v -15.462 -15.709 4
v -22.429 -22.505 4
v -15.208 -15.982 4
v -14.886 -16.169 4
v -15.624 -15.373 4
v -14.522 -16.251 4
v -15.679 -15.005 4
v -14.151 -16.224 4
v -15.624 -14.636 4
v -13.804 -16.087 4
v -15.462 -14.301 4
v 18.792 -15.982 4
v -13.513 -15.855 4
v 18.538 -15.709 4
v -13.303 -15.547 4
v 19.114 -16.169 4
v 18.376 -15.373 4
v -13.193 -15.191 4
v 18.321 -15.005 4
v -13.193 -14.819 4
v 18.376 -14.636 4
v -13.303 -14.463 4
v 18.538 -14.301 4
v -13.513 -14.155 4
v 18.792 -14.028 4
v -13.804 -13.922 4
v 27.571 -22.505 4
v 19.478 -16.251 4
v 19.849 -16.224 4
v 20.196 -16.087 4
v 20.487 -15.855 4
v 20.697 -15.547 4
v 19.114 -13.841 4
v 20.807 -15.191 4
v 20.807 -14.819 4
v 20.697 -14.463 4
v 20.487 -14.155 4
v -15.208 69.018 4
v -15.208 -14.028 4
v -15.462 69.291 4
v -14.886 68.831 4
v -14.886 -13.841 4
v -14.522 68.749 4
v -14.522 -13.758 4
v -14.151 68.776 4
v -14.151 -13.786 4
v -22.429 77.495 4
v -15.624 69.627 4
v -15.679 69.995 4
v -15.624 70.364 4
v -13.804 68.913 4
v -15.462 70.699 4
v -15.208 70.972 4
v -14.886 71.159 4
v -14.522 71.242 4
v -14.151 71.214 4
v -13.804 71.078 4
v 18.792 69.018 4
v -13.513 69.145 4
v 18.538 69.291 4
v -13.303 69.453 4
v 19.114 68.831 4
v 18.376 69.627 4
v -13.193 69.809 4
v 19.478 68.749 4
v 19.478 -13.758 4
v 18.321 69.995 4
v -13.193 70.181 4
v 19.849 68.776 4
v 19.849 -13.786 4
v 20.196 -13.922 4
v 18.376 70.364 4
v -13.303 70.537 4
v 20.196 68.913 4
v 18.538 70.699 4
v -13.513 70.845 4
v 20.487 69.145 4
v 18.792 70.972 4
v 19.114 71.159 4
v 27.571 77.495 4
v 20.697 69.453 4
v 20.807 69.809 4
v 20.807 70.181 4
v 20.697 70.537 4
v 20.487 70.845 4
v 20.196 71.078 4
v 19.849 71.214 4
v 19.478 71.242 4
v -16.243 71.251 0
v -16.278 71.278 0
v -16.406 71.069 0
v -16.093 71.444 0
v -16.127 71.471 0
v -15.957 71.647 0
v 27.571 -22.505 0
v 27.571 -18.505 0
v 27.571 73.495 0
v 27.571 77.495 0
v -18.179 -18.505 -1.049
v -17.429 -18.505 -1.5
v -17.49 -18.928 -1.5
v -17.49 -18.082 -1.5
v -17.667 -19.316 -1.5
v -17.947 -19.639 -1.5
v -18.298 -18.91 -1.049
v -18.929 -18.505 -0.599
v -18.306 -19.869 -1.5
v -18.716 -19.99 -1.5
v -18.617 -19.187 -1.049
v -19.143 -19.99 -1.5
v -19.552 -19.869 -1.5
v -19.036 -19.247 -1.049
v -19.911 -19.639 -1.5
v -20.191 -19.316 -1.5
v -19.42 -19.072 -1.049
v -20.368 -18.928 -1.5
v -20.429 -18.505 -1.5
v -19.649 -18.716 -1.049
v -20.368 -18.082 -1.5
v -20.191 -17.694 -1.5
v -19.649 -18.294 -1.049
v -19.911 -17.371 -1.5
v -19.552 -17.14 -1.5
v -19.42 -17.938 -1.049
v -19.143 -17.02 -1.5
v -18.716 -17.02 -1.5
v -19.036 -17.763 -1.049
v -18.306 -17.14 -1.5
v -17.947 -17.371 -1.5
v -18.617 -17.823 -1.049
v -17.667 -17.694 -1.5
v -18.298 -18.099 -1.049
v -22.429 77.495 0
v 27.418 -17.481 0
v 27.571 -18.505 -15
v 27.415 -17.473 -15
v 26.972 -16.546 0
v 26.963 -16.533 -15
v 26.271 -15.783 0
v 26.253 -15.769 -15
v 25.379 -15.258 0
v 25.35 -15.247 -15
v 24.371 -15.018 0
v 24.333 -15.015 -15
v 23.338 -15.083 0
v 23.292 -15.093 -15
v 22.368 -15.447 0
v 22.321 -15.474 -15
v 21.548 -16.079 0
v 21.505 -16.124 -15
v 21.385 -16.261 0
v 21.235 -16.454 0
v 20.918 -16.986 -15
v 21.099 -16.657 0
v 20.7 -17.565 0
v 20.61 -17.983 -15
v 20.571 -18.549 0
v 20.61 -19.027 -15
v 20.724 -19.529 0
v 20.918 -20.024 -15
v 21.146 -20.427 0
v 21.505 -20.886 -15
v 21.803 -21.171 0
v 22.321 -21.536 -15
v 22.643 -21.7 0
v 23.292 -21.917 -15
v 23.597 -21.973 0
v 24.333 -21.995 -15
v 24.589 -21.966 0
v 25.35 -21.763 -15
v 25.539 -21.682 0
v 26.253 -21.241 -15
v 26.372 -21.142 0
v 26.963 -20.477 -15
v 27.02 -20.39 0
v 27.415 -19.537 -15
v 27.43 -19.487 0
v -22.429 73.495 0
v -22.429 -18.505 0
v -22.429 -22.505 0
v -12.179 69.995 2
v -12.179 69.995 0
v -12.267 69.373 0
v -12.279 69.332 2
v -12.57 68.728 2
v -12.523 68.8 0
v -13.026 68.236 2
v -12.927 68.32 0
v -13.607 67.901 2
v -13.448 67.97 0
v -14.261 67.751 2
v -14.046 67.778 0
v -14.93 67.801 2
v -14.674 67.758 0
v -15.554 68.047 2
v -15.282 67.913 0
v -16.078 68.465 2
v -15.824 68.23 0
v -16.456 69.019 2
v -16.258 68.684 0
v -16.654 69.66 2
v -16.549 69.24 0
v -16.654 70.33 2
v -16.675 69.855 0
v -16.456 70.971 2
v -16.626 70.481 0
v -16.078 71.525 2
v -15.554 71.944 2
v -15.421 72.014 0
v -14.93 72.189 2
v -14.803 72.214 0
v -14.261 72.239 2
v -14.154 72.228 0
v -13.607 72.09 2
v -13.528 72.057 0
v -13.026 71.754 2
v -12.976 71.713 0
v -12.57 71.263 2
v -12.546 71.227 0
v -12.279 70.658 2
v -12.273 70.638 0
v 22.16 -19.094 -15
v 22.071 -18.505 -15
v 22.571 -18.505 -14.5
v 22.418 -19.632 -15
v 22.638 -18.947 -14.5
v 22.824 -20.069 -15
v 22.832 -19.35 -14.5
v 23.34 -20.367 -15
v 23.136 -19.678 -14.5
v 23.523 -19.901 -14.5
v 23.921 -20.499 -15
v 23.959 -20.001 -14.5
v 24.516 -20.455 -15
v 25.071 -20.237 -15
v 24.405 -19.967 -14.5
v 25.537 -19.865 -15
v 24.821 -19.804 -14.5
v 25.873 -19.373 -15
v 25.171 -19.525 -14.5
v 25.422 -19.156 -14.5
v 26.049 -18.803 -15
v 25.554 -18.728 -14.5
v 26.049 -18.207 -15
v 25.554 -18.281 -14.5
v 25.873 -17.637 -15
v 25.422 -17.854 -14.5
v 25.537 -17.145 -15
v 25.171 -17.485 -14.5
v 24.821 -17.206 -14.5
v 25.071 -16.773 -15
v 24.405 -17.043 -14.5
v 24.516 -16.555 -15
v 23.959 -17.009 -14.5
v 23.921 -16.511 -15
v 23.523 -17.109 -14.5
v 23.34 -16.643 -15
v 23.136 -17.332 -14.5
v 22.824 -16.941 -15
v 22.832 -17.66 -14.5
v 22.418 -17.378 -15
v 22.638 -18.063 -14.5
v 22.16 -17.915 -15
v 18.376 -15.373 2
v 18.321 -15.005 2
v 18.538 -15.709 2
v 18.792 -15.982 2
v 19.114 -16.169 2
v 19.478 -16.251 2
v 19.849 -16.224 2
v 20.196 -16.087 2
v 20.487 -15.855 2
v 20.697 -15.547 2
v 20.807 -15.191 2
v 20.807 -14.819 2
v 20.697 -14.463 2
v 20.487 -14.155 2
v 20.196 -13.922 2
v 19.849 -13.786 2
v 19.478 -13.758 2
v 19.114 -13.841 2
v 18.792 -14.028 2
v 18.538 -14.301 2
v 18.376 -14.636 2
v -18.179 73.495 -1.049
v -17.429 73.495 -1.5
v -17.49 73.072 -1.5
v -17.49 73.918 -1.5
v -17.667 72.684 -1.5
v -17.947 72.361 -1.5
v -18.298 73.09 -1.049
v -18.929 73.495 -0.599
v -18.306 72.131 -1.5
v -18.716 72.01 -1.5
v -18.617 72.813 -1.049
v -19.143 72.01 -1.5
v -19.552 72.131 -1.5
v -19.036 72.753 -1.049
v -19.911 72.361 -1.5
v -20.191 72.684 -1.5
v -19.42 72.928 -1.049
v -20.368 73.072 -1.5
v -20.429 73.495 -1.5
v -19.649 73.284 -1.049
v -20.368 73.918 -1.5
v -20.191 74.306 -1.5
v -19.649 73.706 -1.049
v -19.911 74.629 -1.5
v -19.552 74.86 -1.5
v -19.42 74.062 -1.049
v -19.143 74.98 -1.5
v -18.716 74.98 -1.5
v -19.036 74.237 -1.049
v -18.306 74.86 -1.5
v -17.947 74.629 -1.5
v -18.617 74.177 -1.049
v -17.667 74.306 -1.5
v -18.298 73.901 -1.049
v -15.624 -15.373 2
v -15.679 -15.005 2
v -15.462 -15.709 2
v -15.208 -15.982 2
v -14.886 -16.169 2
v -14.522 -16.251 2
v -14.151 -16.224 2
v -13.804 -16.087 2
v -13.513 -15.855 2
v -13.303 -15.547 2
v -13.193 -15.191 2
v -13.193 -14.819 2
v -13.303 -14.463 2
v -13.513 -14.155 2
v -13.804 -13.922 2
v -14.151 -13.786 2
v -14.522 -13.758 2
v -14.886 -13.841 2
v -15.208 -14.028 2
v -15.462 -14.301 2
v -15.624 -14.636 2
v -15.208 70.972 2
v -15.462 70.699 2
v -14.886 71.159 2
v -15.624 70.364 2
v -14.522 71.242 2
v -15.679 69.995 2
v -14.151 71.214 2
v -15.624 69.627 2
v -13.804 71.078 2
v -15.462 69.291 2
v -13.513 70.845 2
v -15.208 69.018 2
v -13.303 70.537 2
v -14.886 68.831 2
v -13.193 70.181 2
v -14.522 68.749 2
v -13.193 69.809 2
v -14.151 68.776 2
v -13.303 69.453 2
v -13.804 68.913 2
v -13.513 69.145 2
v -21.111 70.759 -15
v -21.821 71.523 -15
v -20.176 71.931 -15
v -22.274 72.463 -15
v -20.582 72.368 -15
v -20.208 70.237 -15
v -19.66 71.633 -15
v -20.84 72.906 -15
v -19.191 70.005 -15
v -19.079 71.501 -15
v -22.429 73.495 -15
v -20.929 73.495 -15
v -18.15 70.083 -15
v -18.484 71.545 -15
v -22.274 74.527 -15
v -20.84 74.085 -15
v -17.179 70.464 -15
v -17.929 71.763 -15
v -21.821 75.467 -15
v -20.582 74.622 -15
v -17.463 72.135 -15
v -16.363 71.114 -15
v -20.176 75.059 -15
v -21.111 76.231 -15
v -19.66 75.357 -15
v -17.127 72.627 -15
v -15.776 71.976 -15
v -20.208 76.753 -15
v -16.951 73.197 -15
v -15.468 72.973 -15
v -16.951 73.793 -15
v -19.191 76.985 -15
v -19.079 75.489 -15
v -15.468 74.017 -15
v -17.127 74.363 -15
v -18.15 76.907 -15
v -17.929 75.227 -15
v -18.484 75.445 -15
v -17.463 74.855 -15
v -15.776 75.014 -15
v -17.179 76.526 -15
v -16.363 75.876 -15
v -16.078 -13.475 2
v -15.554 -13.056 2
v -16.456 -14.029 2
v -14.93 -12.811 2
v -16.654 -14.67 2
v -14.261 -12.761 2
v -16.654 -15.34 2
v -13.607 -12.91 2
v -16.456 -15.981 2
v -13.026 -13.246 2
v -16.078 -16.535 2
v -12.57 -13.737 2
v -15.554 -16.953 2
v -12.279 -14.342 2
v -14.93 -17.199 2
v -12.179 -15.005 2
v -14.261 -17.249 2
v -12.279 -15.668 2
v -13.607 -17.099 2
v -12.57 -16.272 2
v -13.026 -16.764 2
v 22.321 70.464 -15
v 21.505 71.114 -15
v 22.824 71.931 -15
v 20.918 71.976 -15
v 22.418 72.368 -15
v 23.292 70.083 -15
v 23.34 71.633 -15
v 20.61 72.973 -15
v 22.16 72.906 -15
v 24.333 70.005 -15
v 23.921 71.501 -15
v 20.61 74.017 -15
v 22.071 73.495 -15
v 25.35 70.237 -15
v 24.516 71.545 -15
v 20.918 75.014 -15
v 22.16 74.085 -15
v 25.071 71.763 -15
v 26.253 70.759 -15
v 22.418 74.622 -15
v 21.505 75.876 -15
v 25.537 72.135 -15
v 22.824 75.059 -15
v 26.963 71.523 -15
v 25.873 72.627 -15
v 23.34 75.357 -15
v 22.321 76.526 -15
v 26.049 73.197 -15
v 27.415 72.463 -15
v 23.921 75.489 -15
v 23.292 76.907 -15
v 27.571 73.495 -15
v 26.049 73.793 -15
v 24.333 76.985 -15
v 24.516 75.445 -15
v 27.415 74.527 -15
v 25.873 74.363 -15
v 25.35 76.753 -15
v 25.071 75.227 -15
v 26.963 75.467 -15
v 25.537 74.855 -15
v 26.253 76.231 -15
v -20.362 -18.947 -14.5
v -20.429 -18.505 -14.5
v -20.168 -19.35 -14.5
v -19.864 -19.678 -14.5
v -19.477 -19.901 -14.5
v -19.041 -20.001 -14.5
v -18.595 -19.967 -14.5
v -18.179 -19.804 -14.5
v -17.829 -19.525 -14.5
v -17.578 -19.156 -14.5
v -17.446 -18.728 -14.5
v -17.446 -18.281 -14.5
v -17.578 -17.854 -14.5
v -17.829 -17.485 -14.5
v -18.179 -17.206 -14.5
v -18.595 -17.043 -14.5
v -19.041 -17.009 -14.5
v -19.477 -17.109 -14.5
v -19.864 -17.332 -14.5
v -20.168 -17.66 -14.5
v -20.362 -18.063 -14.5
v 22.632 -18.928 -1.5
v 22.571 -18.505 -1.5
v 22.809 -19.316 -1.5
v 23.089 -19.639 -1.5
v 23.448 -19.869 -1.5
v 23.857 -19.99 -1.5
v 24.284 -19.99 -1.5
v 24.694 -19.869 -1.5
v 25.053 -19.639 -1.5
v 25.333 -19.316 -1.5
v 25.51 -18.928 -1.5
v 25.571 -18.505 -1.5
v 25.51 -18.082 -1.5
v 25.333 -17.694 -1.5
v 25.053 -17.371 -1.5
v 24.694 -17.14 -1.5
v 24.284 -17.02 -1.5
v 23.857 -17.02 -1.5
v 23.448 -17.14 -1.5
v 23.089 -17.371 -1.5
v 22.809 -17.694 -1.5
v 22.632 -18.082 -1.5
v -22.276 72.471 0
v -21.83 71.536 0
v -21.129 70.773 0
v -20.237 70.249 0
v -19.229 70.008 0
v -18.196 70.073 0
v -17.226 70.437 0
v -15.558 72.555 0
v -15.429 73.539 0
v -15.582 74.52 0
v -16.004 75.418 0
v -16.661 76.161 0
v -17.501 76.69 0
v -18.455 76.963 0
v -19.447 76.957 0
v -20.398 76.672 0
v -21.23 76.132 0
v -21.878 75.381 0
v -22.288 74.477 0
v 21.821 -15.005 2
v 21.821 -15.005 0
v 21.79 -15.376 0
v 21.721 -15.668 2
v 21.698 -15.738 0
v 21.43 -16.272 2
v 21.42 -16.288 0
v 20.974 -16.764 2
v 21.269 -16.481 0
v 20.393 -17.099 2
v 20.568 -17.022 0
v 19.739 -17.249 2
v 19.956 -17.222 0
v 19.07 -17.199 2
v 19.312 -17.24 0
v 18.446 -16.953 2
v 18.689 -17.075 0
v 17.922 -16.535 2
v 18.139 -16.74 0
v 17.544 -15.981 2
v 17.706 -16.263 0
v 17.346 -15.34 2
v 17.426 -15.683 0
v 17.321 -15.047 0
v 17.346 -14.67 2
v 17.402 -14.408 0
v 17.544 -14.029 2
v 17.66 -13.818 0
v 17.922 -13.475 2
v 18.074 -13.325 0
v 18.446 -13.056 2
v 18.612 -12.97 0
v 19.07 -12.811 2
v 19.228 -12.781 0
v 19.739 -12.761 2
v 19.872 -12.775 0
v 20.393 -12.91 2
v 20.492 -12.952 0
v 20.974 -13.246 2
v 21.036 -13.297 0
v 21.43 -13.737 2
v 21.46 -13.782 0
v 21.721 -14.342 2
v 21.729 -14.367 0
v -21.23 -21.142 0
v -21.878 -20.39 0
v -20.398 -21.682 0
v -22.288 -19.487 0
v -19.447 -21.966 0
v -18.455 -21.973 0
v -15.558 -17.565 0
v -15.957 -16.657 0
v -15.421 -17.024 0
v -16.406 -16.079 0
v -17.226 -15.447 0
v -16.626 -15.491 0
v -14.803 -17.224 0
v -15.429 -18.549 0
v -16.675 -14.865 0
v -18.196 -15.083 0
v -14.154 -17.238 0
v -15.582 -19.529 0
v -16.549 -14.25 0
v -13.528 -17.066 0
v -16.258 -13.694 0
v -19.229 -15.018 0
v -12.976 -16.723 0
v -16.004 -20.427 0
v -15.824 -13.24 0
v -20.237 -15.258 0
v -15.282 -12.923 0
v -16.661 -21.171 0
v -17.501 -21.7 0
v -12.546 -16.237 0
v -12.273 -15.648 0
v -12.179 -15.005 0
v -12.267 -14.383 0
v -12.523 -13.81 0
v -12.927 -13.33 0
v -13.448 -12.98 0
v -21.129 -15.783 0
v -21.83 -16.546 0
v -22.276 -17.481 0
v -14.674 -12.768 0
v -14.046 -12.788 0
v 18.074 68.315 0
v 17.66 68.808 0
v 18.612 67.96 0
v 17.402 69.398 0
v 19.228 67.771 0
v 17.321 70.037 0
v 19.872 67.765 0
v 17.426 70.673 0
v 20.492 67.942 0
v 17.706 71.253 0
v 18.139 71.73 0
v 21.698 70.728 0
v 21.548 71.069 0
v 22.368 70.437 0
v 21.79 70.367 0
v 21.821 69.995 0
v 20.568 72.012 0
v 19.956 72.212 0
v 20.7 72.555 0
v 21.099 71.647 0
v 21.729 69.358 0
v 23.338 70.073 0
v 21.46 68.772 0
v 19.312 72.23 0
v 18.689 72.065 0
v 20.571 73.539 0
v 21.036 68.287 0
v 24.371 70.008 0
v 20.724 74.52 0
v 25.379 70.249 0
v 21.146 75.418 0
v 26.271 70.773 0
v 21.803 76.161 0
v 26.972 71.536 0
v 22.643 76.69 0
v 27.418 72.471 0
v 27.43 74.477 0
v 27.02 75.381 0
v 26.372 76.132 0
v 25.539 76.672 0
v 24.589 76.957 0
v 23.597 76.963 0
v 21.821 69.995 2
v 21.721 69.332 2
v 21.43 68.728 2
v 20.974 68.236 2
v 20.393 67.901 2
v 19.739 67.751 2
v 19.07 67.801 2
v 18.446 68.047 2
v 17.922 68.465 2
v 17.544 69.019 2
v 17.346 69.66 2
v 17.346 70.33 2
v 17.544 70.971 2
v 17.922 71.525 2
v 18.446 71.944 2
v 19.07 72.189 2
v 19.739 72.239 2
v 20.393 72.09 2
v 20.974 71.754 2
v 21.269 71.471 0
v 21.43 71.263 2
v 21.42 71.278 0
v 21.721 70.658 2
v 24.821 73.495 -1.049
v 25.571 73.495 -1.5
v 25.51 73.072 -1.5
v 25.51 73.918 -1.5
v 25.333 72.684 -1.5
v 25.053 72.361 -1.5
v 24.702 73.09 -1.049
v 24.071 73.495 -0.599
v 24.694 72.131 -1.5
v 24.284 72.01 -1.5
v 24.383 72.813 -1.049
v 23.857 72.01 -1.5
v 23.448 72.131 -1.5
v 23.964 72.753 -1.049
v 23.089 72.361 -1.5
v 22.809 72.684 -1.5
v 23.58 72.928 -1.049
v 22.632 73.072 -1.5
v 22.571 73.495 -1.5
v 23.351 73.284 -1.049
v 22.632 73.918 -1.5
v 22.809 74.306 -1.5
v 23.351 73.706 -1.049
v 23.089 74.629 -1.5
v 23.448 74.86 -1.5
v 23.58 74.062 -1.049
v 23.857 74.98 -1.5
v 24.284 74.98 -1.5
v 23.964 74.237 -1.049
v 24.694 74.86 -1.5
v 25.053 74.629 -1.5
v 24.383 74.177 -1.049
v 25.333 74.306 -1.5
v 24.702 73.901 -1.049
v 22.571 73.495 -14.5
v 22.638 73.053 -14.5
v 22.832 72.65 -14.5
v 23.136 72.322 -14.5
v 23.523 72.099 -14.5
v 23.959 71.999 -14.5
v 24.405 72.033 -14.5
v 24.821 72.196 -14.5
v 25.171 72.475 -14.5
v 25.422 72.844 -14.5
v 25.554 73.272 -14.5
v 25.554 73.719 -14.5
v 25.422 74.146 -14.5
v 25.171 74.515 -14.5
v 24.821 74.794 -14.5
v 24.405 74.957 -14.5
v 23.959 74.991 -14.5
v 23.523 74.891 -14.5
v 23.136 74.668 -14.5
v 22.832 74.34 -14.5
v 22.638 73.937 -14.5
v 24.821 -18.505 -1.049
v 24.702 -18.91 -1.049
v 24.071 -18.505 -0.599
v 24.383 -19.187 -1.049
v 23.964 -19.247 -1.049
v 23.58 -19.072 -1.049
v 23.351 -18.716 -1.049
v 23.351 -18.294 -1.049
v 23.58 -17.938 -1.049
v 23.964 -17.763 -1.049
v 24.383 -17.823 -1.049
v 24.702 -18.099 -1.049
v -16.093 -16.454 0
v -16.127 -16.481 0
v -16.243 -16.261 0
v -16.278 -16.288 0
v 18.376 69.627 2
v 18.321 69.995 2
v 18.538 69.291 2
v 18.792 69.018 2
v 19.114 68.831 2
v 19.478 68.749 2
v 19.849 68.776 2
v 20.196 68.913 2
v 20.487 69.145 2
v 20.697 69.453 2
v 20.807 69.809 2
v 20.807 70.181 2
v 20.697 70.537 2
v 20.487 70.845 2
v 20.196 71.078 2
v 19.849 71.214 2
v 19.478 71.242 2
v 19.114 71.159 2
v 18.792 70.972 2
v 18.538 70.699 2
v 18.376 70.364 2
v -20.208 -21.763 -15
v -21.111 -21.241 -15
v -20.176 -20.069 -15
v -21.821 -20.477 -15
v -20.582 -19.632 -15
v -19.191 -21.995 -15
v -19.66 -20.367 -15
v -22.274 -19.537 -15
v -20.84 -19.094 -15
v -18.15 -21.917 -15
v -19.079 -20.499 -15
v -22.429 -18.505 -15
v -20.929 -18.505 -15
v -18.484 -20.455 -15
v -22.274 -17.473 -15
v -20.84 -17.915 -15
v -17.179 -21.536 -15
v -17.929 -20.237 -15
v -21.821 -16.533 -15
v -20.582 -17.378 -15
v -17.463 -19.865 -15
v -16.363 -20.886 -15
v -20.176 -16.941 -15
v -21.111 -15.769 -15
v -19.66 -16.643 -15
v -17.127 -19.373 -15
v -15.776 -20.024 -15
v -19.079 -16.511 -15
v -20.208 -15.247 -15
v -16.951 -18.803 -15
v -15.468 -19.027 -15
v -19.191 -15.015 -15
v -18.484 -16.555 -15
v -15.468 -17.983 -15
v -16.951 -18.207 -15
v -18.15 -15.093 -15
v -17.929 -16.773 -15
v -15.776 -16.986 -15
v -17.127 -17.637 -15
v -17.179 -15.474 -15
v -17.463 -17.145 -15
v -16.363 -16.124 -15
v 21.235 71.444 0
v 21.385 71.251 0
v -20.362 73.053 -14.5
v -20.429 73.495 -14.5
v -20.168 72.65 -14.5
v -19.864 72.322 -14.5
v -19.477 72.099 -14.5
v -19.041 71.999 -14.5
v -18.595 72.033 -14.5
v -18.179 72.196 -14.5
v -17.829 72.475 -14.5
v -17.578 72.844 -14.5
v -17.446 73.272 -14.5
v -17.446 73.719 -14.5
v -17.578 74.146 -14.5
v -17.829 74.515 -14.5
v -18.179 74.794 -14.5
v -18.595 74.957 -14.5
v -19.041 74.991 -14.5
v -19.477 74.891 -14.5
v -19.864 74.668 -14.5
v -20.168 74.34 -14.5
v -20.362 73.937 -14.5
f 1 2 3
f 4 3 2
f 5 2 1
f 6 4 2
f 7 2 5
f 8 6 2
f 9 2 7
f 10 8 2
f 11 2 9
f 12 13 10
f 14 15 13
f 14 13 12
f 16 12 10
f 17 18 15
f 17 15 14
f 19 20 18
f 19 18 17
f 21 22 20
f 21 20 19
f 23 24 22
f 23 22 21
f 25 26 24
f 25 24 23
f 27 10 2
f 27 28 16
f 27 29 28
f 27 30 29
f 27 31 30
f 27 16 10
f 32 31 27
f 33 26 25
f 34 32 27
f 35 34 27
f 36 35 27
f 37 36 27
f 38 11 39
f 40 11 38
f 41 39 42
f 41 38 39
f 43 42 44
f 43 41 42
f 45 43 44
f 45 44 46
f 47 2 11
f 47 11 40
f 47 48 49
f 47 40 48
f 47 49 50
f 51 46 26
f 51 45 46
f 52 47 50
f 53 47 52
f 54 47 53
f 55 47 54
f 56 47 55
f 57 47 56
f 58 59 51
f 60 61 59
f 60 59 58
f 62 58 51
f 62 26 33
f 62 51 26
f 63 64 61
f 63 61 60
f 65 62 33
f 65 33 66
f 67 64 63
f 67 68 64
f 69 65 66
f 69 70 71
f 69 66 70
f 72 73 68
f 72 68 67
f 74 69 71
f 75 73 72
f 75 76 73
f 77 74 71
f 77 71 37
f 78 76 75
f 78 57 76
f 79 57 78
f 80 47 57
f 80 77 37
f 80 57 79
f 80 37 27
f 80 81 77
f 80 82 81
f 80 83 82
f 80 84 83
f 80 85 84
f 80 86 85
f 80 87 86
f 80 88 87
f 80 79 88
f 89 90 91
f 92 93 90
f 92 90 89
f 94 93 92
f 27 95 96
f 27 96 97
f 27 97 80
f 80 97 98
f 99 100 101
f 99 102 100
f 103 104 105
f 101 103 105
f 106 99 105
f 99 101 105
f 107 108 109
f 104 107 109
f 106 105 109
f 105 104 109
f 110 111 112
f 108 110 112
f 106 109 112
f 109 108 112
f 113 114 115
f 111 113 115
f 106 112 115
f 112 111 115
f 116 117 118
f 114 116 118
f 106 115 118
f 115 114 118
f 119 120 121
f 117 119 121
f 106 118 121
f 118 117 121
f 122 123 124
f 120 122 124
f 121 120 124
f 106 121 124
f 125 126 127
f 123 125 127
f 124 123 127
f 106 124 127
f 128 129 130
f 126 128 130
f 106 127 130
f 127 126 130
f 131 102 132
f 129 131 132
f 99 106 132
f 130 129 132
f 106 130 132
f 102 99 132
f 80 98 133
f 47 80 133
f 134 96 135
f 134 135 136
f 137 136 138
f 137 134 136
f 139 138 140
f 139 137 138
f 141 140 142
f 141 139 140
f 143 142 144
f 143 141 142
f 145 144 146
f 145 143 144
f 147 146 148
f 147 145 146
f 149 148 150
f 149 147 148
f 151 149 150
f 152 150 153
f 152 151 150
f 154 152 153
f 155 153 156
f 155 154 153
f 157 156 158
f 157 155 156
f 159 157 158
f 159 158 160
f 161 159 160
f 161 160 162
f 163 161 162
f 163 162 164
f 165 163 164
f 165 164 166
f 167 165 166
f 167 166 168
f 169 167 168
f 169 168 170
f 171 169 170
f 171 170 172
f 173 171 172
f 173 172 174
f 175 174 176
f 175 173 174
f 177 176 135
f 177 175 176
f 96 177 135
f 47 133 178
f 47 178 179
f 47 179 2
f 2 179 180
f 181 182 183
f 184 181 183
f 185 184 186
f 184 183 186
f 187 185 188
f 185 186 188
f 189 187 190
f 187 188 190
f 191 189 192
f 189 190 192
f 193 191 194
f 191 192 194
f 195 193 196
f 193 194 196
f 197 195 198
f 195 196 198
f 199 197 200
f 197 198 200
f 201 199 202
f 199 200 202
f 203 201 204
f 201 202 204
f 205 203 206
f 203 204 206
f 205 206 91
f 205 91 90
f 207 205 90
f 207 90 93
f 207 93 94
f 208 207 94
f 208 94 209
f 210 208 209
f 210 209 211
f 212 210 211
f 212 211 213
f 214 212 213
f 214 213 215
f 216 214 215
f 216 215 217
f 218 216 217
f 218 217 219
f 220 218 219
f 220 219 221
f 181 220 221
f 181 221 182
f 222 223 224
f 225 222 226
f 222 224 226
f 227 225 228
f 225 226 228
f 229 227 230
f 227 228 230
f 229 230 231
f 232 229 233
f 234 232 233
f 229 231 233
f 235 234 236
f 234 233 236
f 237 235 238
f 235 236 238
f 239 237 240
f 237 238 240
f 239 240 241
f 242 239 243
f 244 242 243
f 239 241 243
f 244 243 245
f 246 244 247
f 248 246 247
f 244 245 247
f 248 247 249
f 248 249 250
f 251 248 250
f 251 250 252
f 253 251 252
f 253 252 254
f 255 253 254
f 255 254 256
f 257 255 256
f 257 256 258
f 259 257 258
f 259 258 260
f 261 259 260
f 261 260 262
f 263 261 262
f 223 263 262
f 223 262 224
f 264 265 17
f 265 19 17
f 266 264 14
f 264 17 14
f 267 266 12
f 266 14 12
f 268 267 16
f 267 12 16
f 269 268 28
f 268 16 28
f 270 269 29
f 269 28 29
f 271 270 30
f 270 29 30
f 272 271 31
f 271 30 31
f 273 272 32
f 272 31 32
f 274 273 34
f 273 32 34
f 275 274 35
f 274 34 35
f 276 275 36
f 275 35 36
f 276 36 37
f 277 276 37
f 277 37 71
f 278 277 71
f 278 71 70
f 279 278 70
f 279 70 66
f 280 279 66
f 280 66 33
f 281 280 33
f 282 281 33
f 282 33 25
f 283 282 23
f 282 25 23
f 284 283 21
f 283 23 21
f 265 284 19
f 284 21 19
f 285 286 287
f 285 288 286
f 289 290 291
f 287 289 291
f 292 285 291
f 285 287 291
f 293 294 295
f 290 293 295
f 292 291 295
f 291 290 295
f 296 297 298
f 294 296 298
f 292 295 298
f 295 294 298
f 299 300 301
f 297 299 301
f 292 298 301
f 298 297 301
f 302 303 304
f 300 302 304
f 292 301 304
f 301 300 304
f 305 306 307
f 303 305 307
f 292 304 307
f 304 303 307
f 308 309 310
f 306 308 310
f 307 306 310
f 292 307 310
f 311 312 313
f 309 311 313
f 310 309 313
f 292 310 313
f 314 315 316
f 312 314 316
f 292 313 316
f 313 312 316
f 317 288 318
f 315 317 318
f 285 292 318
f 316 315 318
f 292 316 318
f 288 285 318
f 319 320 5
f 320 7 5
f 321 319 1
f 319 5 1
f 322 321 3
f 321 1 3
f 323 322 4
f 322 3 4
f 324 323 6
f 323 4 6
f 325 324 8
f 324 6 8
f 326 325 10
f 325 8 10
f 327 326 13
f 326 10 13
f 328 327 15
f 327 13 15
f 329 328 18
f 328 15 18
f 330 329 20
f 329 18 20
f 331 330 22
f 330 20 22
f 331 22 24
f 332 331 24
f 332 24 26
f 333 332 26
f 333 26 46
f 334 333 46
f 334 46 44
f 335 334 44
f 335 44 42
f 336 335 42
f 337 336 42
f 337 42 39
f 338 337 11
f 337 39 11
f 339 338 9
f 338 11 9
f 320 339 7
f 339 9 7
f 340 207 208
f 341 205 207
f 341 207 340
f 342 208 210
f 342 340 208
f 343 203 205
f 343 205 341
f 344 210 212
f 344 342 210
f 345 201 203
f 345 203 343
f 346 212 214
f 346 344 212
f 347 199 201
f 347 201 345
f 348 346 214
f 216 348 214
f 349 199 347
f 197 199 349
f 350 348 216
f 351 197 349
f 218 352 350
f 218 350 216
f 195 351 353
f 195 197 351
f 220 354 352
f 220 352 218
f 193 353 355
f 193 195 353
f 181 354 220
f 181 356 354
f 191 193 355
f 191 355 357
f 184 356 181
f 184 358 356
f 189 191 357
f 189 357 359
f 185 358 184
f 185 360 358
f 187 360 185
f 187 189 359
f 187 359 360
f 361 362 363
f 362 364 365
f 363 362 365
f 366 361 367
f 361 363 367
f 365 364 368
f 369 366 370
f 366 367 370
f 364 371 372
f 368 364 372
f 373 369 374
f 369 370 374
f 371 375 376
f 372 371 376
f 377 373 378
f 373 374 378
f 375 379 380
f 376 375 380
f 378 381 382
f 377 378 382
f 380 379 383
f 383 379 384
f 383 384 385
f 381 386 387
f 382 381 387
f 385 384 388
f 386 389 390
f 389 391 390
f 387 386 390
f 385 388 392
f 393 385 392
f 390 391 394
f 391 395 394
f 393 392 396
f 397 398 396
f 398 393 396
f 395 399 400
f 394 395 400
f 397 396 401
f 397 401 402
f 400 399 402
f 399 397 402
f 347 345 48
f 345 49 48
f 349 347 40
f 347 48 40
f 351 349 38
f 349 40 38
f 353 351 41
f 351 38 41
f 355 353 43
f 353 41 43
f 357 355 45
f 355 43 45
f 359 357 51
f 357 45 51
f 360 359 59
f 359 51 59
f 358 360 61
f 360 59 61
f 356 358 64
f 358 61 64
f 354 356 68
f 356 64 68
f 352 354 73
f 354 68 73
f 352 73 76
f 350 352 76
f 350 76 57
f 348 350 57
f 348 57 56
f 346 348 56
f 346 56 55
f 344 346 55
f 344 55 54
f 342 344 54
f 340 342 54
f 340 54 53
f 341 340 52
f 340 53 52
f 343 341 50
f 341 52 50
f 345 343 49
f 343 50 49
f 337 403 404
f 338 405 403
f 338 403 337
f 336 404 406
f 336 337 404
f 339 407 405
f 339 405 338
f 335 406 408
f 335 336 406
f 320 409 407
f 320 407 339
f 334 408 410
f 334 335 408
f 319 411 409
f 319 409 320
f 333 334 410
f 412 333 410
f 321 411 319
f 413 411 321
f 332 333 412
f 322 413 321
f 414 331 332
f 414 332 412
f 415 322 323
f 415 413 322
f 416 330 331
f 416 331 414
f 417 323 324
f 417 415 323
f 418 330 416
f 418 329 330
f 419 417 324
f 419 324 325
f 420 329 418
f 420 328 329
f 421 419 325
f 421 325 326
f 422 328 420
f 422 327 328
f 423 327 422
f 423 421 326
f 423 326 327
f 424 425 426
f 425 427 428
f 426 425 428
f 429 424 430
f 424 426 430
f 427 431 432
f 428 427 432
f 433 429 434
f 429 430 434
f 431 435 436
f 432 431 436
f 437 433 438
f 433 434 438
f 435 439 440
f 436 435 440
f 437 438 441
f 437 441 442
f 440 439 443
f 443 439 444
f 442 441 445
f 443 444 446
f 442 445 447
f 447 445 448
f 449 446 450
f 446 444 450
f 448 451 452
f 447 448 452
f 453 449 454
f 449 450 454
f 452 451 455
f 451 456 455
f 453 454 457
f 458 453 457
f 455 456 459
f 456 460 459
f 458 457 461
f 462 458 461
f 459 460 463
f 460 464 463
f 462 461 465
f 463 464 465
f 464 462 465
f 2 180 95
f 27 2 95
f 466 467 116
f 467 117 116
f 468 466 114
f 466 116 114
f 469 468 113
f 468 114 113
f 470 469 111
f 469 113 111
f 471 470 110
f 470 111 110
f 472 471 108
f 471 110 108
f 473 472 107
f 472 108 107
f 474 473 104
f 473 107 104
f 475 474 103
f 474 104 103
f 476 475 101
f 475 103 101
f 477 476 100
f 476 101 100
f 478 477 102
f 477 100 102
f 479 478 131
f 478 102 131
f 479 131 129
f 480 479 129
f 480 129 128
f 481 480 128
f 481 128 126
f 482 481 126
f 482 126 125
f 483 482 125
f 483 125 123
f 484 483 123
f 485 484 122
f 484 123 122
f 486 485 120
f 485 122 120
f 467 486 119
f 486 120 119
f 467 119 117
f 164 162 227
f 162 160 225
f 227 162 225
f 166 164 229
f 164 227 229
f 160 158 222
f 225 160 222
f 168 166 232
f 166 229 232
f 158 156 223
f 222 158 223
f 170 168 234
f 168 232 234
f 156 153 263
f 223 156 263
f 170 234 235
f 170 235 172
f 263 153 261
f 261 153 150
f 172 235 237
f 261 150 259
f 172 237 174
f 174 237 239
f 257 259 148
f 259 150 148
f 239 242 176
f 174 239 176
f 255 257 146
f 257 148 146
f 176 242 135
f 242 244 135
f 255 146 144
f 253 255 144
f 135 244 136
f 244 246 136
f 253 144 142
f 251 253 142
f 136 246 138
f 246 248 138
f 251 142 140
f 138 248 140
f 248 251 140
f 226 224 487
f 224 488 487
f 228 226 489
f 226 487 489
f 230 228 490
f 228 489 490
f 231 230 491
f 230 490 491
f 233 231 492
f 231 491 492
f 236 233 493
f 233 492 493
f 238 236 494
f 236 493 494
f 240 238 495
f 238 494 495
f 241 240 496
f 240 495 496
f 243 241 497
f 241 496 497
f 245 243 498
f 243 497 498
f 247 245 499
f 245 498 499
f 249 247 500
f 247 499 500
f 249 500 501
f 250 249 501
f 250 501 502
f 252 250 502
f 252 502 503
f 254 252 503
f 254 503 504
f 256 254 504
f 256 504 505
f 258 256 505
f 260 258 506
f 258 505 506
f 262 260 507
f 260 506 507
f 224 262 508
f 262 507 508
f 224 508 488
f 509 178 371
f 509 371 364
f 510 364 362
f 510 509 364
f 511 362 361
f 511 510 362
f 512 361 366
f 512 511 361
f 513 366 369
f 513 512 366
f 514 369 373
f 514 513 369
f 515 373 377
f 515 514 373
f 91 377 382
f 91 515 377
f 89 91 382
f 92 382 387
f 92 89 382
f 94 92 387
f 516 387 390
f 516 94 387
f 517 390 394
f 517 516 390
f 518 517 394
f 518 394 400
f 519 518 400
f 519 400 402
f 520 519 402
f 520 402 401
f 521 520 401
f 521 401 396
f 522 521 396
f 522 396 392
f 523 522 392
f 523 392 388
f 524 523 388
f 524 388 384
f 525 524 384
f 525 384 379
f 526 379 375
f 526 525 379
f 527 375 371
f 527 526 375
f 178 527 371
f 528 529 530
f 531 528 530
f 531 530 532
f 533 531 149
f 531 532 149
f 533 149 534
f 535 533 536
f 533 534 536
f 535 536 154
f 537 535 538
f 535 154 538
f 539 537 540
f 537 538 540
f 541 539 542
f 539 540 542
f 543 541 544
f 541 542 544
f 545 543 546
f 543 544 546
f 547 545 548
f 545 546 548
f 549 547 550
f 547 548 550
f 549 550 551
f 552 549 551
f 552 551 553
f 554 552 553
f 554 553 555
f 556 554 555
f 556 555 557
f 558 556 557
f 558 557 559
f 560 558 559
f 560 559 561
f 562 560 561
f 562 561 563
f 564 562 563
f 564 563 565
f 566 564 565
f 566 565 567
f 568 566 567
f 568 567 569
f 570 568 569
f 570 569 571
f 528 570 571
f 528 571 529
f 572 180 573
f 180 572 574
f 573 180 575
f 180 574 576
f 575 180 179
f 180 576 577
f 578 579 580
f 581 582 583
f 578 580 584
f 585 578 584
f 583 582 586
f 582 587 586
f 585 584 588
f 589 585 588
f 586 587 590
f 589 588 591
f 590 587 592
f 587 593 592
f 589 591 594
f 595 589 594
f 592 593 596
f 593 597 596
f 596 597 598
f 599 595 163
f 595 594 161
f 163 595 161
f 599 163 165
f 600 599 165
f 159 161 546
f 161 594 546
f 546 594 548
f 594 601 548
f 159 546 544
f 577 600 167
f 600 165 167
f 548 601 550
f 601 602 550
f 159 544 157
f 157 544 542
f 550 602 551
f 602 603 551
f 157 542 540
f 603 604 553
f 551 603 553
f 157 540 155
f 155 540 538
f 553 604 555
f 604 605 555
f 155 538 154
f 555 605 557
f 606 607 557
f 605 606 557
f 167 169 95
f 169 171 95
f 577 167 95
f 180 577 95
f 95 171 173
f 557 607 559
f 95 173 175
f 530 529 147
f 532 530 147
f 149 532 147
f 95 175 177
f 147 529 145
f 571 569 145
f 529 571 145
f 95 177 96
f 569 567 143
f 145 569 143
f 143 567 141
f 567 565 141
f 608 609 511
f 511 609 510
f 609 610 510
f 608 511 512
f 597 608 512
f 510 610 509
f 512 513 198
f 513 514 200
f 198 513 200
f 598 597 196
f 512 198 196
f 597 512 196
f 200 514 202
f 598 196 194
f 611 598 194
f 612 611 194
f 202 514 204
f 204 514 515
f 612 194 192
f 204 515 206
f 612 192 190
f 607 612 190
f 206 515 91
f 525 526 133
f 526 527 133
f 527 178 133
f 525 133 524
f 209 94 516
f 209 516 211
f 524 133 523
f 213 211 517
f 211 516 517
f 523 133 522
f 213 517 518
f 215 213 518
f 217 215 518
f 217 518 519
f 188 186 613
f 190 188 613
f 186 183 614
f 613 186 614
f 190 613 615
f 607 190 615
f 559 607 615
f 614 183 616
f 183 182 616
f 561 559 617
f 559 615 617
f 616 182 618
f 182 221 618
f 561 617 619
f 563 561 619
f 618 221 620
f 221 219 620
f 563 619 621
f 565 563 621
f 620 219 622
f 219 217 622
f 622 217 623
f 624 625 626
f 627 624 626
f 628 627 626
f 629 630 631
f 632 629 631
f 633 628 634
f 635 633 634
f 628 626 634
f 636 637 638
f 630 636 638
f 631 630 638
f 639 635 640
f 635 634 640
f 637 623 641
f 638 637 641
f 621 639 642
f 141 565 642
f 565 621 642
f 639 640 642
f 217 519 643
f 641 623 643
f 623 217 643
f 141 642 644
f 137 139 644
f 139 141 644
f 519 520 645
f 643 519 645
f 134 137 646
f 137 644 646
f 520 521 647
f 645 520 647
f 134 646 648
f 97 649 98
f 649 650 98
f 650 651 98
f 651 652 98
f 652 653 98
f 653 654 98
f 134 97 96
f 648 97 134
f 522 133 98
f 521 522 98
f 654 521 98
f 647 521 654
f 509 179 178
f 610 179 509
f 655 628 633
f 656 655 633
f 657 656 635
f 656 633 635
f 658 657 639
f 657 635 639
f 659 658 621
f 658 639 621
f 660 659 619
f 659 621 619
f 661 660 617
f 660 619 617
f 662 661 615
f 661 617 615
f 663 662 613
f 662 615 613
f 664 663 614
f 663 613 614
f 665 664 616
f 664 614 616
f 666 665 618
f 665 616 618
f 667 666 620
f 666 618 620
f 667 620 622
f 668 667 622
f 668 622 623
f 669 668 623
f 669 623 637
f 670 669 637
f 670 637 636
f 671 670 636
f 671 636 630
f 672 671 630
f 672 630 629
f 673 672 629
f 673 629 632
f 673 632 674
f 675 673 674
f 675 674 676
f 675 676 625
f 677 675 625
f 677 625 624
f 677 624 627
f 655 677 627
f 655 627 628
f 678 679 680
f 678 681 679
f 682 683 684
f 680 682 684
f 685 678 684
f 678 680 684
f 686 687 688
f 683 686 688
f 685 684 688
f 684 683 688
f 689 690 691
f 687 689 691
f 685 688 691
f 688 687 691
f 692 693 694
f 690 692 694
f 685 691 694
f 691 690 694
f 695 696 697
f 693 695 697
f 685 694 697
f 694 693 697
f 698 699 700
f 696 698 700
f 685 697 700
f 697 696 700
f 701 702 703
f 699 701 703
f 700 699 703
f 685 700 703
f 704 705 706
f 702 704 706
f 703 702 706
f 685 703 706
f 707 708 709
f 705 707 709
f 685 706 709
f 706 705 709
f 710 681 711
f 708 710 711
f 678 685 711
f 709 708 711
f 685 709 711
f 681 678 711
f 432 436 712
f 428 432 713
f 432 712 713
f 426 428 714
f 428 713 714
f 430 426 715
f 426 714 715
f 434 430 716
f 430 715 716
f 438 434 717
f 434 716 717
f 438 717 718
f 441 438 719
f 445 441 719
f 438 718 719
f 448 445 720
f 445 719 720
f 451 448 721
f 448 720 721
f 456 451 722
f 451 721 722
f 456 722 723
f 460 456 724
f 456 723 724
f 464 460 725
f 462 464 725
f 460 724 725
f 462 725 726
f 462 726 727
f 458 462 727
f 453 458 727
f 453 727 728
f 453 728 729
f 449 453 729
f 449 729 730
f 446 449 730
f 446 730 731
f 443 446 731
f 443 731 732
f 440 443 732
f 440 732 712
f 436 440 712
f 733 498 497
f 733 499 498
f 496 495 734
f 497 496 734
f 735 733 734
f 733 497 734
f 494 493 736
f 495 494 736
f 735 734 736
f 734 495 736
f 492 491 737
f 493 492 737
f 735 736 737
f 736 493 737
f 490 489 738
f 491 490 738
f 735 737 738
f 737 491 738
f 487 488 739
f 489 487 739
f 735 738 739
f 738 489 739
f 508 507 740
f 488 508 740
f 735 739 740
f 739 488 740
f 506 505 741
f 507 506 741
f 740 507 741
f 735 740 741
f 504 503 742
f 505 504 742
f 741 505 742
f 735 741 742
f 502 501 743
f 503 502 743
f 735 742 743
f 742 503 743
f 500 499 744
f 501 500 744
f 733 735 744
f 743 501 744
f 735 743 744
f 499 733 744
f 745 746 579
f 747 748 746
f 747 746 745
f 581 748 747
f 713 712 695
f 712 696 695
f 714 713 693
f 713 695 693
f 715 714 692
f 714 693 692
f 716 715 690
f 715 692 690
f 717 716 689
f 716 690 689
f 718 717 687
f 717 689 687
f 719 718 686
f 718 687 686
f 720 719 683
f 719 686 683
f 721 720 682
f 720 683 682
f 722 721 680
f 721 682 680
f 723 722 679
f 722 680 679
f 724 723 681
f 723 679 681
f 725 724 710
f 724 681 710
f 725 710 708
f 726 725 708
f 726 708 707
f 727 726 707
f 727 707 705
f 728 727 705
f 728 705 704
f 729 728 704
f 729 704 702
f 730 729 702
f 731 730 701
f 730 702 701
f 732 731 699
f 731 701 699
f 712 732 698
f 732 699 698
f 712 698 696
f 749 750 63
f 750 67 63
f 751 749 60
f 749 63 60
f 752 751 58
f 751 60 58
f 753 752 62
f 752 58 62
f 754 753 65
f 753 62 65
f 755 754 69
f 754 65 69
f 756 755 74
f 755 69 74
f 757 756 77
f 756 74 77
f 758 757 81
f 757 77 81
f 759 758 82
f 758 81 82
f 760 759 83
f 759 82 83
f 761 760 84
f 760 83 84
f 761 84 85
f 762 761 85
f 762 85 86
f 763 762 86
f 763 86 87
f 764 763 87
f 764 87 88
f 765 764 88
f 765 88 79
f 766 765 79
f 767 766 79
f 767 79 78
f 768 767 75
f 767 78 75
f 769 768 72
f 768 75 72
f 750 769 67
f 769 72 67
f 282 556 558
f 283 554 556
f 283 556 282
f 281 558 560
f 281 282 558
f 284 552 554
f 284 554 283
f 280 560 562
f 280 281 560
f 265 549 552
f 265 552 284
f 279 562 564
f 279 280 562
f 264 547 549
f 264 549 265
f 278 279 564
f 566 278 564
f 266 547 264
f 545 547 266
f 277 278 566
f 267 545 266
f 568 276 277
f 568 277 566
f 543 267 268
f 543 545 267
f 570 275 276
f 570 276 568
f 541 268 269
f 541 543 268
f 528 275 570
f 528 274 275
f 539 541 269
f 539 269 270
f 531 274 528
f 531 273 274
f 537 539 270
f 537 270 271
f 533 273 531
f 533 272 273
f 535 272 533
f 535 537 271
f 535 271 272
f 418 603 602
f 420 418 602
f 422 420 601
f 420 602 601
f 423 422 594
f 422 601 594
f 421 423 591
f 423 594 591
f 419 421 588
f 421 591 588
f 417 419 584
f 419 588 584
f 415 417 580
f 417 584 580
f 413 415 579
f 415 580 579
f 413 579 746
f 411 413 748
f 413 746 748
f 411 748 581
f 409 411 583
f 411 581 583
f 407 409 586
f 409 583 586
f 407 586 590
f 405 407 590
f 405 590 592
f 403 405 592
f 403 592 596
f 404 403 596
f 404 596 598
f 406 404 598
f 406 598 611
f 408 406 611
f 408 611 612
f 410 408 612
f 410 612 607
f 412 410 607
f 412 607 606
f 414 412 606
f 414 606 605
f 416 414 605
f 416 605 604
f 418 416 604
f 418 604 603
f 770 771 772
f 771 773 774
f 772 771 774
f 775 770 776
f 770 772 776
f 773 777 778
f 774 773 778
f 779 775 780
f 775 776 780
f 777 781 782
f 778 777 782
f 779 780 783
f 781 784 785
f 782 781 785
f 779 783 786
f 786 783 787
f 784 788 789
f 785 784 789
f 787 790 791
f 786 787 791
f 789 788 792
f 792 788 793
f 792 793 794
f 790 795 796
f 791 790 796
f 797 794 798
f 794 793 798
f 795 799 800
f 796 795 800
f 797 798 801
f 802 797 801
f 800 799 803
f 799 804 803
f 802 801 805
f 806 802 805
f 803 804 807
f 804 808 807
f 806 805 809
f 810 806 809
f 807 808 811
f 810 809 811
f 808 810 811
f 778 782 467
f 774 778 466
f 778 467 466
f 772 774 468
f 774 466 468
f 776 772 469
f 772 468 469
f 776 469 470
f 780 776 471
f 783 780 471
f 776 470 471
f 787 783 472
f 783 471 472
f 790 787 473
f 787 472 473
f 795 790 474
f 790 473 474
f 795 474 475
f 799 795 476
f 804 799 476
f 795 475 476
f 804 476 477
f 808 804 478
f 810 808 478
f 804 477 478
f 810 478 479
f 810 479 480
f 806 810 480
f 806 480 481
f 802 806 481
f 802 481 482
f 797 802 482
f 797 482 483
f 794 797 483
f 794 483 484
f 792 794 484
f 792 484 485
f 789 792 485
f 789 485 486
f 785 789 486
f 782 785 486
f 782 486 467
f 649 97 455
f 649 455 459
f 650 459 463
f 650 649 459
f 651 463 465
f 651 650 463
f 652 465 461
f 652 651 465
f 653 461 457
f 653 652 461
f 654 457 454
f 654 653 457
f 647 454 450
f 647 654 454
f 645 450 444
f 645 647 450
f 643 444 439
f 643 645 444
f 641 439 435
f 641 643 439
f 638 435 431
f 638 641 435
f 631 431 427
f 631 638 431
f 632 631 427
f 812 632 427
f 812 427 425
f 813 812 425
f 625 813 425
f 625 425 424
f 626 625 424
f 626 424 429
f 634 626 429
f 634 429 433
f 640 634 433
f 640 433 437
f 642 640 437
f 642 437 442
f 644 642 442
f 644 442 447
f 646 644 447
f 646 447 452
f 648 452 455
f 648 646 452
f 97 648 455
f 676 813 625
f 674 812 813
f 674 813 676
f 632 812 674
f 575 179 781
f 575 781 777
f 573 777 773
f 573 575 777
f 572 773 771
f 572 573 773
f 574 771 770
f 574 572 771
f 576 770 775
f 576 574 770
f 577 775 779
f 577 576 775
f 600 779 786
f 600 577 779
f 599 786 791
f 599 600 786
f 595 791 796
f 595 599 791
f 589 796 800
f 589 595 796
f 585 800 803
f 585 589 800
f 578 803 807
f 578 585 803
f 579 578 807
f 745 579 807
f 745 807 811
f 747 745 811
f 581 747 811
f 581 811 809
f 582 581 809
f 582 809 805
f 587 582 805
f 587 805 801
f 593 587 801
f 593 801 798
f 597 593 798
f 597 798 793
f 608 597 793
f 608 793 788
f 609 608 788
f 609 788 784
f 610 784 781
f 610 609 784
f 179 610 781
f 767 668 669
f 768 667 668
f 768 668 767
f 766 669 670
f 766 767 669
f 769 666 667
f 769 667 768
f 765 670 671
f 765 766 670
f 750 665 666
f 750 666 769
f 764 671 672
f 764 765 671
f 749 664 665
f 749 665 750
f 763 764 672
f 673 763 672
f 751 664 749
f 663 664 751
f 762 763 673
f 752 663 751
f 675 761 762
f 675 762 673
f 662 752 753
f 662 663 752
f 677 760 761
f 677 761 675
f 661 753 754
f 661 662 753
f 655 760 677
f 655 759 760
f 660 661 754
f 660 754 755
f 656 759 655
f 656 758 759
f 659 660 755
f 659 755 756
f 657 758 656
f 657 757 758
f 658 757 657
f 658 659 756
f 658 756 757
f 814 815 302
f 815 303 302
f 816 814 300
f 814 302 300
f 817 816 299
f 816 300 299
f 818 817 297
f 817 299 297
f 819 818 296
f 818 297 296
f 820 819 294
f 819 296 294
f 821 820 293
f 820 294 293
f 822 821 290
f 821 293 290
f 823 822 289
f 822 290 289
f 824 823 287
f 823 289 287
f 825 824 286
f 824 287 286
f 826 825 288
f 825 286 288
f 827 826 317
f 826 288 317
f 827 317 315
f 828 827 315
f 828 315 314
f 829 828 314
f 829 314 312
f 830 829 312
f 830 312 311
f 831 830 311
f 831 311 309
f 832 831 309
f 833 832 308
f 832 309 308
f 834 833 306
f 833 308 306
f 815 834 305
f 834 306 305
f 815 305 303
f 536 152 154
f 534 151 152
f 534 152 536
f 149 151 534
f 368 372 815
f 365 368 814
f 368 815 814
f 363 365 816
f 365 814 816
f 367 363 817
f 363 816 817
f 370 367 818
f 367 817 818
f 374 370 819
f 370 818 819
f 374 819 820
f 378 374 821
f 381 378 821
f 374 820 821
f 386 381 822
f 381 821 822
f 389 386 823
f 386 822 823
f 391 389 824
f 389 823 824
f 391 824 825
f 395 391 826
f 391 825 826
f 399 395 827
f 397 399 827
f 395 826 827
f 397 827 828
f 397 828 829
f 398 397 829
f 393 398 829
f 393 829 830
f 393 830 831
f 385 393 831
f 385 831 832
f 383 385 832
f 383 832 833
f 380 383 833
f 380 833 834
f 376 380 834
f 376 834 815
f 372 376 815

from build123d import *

# Parameters (mm, degrees)
F2_R            = 3.5
F3_DEPTH        = 4
F4_D            = 2.5
F4_CBORE_D      = 4.5
F4_CBORE_DEPTH  = 2
F5_DEPTH        = 15
F7_D            = 3
F7_DEPTH        = 13.5
F7_CSINK_D      = 4
F7_CSINK_ANGLE  = 90
F7_TIP          = 0.9012909285
F9_D            = 3
F9_DEPTH        = 13.5
F9_CSINK_D      = 4
F9_CSINK_ANGLE  = 90
F9_TIP          = 0.9012909285
F11_D           = 3
F11_DEPTH       = 13.5
F11_CSINK_D     = 4
F11_CSINK_ANGLE = 90
F11_TIP         = 0.9012909285
F13_D           = 3
F13_DEPTH       = 13.5
F13_CSINK_D     = 4
F13_CSINK_ANGLE = 90
F13_TIP         = 0.9012909285


with BuildPart() as f3:
    # F2 (on Top) → F3 (new body)
    with BuildSketch(Plane.XY):
        Polygon((27.5709562153, 77.495081059), (-22.4290437847, 77.495081059), (-22.4290437847, 73.495081059), (-22.4290437847, -18.5049188996), (-22.4290437847, -22.504918941), (27.5709562153, -22.504918941), (27.5709562153, -18.504918941), (27.5709562153, 73.495081059), align=None)
        with BuildLine():
            ThreePointArc((-15.4290437847, -18.504918941), (-18.9290438054, -22.004918941), (-22.4290437847, -18.5049188996))
            ThreePointArc((-22.4290437847, -18.5049188996), (-18.9290437641, -15.004918941), (-15.4290437847, -18.504918941))
        make_face(mode=Mode.SUBTRACT)
        with Locations((24.0709562153, -18.504918941)):
            Circle(F2_R, mode=Mode.SUBTRACT)
        with BuildLine():
            ThreePointArc((-15.4290437847, 73.495081059), (-18.9290437847, 69.995081059), (-22.4290437847, 73.495081059))
            ThreePointArc((-22.4290437847, 73.495081059), (-18.9290437847, 76.995081059), (-15.4290437847, 73.495081059))
        make_face(mode=Mode.SUBTRACT)
        with Locations((24.0709562153, 73.495081059)):
            Circle(F2_R, mode=Mode.SUBTRACT)
        with BuildLine():
            ThreePointArc((-15.4290437847, -18.504918941), (-18.9290437641, -15.004918941), (-22.4290437847, -18.5049188996))
            ThreePointArc((-22.4290437847, -18.5049188996), (-18.9290438054, -22.004918941), (-15.4290437847, -18.504918941))
        make_face()
        with Locations((24.0709562153, -18.504918941)):
            Circle(F2_R)
        with BuildLine():
            ThreePointArc((-15.4290437847, 73.495081059), (-18.9290437847, 76.995081059), (-22.4290437847, 73.495081059))
            ThreePointArc((-22.4290437847, 73.495081059), (-18.9290437847, 69.995081059), (-15.4290437847, 73.495081059))
        make_face()
        with Locations((24.0709562153, 73.495081059)):
            Circle(F2_R)
    extrude(amount=F3_DEPTH)

    # F4 (through all)
    with Locations(Plane(origin=(0, 0, 0), x_dir=(1, 0, 0), z_dir=(0, 0, -1))):
        with Locations((19.5709562153, -69.995081059), (19.5709562153, 15.004918941), (-14.4290437847, 15.004918941), (-14.4290437847, -69.995081059)):
            CounterBoreHole(F4_D / 2, F4_CBORE_D / 2, F4_CBORE_DEPTH)

    # F2 (on Top) → F5 (join)
    with BuildSketch(Plane.XY):
        with BuildLine():
            ThreePointArc((-15.4290437847, -18.504918941), (-18.9290437641, -15.004918941), (-22.4290437847, -18.5049188996))
            ThreePointArc((-22.4290437847, -18.5049188996), (-18.9290438054, -22.004918941), (-15.4290437847, -18.504918941))
        make_face()
        with Locations((24.0709562153, -18.504918941)):
            Circle(F2_R)
        with BuildLine():
            ThreePointArc((-15.4290437847, 73.495081059), (-18.9290437847, 76.995081059), (-22.4290437847, 73.495081059))
            ThreePointArc((-22.4290437847, 73.495081059), (-18.9290437847, 69.995081059), (-15.4290437847, 73.495081059))
        make_face()
        with Locations((24.0709562153, 73.495081059)):
            Circle(F2_R)
    extrude(amount=-F5_DEPTH)

    # F7
    with Locations(Plane(origin=(0, 0, -15), x_dir=(1, 0, 0), z_dir=(0, 0, -1))):
        with Locations((-18.9290437847, -73.495081059)):
            CounterSinkHole(F7_D / 2, F7_CSINK_D / 2, depth=F7_DEPTH, counter_sink_angle=F7_CSINK_ANGLE)
            with Locations((0, 0, -(F7_DEPTH + F7_TIP / 2))):  # 118° drill point
                Cone(0, F7_D / 2, F7_TIP, mode=Mode.SUBTRACT)

    # F9
    with Locations(Plane(origin=(0, 0, -15), x_dir=(1, 0, 0), z_dir=(0, 0, -1))):
        with Locations((-18.9290437847, 18.504918941)):
            CounterSinkHole(F9_D / 2, F9_CSINK_D / 2, depth=F9_DEPTH, counter_sink_angle=F9_CSINK_ANGLE)
            with Locations((0, 0, -(F9_DEPTH + F9_TIP / 2))):  # 118° drill point
                Cone(0, F9_D / 2, F9_TIP, mode=Mode.SUBTRACT)

    # F11
    with Locations(Plane(origin=(0, 0, -15), x_dir=(1, 0, 0), z_dir=(0, 0, -1))):
        with Locations((24.0709562153, -73.495081059)):
            CounterSinkHole(F11_D / 2, F11_CSINK_D / 2, depth=F11_DEPTH, counter_sink_angle=F11_CSINK_ANGLE)
            with Locations((0, 0, -(F11_DEPTH + F11_TIP / 2))):  # 118° drill point
                Cone(0, F11_D / 2, F11_TIP, mode=Mode.SUBTRACT)

    # F13
    with Locations(Plane(origin=(0, 0, -15), x_dir=(1, 0, 0), z_dir=(0, 0, -1))):
        with Locations((24.0709562153, 18.504918941)):
            CounterSinkHole(F13_D / 2, F13_CSINK_D / 2, depth=F13_DEPTH, counter_sink_angle=F13_CSINK_ANGLE)
            with Locations((0, 0, -(F13_DEPTH + F13_TIP / 2))):  # 118° drill point
                Cone(0, F13_D / 2, F13_TIP, mode=Mode.SUBTRACT)


solid = f3.part
